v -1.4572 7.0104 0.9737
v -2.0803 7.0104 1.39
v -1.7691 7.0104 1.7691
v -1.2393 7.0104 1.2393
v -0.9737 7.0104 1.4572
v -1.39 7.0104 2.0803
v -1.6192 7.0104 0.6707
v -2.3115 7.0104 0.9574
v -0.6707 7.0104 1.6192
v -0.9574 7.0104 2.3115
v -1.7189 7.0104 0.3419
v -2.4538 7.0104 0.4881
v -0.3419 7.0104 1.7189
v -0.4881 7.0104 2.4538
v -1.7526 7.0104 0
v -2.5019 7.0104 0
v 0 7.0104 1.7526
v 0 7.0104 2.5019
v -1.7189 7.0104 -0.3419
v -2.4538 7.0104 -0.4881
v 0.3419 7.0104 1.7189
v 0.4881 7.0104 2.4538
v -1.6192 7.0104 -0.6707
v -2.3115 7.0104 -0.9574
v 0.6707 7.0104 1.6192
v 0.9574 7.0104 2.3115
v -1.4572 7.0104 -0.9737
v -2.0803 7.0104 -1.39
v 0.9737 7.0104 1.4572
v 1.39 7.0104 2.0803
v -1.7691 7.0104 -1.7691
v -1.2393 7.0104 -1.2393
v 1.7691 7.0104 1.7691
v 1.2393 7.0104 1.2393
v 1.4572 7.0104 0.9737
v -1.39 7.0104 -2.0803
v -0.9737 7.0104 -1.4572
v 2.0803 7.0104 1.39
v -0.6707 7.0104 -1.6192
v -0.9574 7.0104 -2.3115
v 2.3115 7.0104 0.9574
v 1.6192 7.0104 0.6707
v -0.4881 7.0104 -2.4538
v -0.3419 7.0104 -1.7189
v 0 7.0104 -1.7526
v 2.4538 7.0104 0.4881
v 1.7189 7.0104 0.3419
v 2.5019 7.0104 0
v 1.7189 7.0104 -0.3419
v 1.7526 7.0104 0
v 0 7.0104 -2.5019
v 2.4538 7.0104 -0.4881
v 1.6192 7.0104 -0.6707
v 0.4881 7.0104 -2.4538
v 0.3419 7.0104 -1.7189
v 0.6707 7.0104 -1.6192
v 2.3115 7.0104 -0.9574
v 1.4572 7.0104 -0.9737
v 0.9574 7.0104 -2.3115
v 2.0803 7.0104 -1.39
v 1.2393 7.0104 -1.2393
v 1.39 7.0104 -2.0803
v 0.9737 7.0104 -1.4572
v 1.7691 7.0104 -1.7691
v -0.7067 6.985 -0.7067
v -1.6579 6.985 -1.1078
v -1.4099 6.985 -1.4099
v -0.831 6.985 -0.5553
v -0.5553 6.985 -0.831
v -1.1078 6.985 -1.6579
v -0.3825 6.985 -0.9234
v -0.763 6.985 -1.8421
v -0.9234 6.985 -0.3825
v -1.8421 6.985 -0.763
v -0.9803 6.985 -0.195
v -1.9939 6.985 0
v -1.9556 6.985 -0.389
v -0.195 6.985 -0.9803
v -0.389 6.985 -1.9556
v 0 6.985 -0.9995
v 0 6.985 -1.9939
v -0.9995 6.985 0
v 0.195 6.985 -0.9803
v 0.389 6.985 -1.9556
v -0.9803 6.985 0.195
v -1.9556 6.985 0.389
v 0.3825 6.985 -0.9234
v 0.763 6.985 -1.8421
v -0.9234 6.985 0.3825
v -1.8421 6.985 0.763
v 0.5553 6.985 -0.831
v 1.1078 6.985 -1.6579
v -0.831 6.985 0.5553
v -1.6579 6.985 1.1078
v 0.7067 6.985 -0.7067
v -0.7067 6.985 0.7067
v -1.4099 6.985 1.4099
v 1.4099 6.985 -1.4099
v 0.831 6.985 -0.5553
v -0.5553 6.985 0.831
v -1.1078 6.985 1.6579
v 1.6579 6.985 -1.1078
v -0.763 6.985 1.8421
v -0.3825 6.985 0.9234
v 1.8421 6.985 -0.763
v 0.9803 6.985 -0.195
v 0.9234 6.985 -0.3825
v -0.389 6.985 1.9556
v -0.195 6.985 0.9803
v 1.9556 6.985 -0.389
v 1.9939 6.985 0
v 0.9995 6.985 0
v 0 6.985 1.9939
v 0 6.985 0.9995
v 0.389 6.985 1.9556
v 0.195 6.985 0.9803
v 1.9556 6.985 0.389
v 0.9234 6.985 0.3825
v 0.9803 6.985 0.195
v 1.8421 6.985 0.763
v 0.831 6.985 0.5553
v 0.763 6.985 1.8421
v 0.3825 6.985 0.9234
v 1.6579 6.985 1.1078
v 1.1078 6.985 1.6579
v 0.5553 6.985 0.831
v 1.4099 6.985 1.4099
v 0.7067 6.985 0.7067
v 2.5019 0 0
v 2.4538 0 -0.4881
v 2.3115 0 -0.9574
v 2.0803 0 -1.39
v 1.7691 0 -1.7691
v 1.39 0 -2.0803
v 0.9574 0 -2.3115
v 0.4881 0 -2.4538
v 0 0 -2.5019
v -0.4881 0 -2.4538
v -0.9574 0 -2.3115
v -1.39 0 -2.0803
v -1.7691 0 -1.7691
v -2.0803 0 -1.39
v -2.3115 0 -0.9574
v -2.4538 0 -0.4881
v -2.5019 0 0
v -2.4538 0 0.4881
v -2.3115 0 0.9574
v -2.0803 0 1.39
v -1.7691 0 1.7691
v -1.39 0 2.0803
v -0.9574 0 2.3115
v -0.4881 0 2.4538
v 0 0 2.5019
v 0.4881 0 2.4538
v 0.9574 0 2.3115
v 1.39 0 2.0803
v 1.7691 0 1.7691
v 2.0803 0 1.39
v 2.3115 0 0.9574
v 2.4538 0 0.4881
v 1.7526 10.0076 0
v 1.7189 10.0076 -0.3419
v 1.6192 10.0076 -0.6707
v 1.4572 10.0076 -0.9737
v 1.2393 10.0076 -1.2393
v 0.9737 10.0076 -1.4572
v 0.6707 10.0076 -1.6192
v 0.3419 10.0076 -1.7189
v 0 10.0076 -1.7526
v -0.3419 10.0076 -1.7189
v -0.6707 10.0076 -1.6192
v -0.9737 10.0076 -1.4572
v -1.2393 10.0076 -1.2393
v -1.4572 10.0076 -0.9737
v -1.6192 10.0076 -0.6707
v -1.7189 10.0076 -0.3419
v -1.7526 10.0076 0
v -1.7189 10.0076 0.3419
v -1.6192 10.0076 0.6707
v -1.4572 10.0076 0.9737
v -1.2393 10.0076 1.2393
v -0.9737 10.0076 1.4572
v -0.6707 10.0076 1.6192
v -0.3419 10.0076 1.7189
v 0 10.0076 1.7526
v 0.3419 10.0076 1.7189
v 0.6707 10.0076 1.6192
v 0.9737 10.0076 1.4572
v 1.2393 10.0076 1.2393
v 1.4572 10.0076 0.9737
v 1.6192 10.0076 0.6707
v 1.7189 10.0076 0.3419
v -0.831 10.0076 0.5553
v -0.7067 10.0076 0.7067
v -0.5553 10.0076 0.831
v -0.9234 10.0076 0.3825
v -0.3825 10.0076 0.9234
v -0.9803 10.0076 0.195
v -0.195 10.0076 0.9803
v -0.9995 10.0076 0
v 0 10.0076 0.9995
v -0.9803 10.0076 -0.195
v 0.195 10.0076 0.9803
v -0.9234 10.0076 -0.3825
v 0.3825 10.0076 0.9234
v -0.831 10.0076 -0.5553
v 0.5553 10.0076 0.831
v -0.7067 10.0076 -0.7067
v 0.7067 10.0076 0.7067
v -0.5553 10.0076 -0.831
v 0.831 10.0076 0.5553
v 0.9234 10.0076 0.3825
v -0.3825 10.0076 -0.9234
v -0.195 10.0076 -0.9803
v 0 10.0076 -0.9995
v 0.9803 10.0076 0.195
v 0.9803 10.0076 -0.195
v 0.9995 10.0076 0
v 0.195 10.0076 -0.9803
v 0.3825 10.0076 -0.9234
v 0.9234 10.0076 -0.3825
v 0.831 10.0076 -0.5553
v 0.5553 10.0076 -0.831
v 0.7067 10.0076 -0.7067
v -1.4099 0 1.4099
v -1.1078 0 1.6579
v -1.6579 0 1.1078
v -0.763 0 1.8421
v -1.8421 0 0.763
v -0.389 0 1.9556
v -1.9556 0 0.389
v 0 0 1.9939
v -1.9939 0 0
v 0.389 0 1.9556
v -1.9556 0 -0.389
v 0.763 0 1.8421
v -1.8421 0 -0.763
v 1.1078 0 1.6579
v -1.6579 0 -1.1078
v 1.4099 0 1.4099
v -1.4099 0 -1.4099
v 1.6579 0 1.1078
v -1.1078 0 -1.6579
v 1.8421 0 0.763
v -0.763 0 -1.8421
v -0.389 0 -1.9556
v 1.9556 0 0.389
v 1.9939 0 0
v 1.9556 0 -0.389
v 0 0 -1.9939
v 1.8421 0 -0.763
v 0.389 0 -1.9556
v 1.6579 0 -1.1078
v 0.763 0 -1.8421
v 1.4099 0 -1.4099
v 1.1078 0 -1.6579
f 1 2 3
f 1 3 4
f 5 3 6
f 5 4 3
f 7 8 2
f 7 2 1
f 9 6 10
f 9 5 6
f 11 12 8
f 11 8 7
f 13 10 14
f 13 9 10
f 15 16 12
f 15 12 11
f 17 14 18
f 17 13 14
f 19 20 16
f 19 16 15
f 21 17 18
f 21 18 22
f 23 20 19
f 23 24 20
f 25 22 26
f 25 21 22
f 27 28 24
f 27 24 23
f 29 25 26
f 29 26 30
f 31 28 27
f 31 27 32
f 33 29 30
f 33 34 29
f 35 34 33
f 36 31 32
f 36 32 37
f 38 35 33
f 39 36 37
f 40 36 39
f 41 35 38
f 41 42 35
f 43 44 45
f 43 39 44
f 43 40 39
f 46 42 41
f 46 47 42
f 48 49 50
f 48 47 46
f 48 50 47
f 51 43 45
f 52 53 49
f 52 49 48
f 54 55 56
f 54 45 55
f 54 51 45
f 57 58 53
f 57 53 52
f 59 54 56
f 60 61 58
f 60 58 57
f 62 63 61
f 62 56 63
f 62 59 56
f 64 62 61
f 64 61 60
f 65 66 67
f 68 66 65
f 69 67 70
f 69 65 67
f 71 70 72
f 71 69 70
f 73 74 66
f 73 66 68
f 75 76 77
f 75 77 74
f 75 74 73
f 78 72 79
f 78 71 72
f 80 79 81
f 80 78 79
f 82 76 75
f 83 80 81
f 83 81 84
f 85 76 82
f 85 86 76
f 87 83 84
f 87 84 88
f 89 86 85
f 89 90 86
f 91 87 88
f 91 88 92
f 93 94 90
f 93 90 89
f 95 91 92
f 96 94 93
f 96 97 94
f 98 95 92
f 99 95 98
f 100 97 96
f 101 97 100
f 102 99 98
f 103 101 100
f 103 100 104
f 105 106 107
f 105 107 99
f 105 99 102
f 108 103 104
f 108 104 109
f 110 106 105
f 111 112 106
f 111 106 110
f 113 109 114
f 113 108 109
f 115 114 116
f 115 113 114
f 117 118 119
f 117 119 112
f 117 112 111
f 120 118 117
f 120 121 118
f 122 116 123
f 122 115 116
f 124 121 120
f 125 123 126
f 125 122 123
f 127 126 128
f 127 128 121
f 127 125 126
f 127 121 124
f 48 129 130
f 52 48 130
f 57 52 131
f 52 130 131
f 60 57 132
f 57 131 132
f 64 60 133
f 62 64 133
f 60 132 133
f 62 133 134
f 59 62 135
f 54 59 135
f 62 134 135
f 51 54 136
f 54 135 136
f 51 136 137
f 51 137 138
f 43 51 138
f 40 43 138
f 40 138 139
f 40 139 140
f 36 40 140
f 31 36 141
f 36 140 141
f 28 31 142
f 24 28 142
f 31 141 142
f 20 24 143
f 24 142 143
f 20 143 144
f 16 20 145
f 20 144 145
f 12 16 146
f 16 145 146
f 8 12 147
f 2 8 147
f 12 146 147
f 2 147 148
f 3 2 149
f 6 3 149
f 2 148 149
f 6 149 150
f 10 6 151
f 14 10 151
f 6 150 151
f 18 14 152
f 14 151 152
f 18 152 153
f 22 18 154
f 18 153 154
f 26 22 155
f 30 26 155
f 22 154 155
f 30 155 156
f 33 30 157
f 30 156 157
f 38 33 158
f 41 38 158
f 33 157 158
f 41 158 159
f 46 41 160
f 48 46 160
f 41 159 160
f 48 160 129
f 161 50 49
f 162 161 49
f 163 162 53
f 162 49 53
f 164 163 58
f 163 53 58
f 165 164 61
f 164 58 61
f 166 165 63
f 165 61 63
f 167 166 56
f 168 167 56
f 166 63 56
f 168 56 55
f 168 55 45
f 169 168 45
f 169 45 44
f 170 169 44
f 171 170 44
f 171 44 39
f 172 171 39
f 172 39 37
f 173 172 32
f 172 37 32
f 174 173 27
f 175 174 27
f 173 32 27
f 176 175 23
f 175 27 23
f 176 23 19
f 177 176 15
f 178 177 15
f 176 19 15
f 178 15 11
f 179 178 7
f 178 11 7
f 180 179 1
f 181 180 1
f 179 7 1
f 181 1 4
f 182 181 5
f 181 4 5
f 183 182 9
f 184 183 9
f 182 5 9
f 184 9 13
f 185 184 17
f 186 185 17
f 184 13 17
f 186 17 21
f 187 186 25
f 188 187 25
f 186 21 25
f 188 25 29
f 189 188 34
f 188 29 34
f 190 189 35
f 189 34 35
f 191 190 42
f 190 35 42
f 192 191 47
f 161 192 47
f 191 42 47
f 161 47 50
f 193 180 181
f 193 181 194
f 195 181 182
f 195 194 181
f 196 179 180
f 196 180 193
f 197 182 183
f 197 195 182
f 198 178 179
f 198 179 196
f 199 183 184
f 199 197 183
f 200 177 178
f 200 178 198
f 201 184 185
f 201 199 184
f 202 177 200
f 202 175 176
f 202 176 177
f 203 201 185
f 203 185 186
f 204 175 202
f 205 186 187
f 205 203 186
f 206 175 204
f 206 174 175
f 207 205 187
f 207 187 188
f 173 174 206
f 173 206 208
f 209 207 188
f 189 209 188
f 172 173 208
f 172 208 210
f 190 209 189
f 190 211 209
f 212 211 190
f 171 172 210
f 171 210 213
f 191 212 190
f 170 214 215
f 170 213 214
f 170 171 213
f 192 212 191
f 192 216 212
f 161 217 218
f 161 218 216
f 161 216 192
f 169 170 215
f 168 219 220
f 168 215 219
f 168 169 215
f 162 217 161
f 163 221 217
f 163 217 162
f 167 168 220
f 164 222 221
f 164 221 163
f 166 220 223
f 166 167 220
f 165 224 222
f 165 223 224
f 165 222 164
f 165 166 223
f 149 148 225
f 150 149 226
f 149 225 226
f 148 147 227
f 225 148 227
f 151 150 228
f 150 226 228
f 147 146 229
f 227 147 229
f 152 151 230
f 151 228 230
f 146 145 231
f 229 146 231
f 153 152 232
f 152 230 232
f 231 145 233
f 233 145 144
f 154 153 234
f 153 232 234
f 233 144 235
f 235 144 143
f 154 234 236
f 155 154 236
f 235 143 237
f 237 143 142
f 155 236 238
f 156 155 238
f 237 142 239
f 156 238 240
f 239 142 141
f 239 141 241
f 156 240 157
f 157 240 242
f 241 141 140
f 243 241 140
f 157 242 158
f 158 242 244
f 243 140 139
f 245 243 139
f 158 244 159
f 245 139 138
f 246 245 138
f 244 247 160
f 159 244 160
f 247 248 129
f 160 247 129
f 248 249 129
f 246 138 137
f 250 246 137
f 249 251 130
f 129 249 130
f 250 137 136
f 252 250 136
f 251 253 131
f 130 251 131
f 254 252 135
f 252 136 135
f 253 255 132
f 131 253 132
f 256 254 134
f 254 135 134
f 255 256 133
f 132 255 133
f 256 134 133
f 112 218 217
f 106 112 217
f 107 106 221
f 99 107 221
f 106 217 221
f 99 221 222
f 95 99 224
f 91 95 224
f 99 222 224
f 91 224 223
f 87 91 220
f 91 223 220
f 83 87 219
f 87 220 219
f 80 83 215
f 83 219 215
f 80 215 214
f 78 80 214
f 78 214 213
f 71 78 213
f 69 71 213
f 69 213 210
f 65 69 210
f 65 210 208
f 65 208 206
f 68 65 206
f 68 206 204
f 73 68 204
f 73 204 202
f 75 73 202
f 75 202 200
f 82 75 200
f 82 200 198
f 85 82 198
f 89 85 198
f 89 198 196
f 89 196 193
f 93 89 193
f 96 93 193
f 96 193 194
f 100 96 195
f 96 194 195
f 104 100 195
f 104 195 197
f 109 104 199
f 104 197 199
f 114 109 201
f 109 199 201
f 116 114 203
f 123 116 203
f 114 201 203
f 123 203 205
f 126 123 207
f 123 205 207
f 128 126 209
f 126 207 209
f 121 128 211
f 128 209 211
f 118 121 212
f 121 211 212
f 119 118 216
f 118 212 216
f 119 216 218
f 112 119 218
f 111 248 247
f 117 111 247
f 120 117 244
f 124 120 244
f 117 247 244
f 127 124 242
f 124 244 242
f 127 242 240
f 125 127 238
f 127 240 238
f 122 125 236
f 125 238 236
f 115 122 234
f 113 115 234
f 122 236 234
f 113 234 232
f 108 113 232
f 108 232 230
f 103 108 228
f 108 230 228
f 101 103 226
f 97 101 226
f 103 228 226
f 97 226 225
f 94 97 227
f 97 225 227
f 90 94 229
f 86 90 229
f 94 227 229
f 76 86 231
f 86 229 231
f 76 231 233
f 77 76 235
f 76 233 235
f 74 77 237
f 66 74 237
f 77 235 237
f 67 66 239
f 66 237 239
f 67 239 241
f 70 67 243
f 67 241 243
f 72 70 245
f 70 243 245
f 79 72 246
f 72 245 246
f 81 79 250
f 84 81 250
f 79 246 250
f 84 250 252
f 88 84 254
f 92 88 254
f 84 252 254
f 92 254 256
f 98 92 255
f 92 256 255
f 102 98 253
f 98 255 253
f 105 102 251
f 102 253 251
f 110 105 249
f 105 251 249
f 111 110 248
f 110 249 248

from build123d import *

# Parameters (mm, degrees)
SKETCH1_R           = 2.5019
BOSS_EXTRUDE1_DEPTH = 7.0104
SKETCH2_R           = 1.7526
BOSS_EXTRUDE2_DEPTH = 2.9972
SKETCH3_R           = 0.99949
CUT_EXTRUDE1_DEPTH  = 11.0076
SKETCH4_R           = 1.9939
CUT_EXTRUDE2_DEPTH  = 6.985


with BuildPart() as part:
    # Sketch1 → Boss-Extrude1 (new body)
    with BuildSketch(Plane(origin=(0, 0, 0), x_dir=(1, 0, 0), z_dir=(0, 1, 0))):
        Circle(SKETCH1_R)
    extrude(amount=BOSS_EXTRUDE1_DEPTH)

    # Sketch2 → Boss-Extrude2 (add)
    with BuildSketch(Plane(origin=(0, 7.0104, 0), x_dir=(1, 0, 0), z_dir=(0, 1, 0))):
        Circle(SKETCH2_R)
    extrude(amount=BOSS_EXTRUDE2_DEPTH)

    # Sketch3 → Cut-Extrude1 (cut, through all)
    with BuildSketch(Plane(origin=(0, 10.0076, 0), x_dir=(1, 0, 0), z_dir=(0, 1, 0))):
        Circle(SKETCH3_R)
    extrude(amount=-CUT_EXTRUDE1_DEPTH, mode=Mode.SUBTRACT)

    # Sketch4 → Cut-Extrude2 (cut)
    with BuildSketch(Plane.XZ):
        Circle(SKETCH4_R)
    extrude(amount=-CUT_EXTRUDE2_DEPTH, mode=Mode.SUBTRACT)


solid = part.part
